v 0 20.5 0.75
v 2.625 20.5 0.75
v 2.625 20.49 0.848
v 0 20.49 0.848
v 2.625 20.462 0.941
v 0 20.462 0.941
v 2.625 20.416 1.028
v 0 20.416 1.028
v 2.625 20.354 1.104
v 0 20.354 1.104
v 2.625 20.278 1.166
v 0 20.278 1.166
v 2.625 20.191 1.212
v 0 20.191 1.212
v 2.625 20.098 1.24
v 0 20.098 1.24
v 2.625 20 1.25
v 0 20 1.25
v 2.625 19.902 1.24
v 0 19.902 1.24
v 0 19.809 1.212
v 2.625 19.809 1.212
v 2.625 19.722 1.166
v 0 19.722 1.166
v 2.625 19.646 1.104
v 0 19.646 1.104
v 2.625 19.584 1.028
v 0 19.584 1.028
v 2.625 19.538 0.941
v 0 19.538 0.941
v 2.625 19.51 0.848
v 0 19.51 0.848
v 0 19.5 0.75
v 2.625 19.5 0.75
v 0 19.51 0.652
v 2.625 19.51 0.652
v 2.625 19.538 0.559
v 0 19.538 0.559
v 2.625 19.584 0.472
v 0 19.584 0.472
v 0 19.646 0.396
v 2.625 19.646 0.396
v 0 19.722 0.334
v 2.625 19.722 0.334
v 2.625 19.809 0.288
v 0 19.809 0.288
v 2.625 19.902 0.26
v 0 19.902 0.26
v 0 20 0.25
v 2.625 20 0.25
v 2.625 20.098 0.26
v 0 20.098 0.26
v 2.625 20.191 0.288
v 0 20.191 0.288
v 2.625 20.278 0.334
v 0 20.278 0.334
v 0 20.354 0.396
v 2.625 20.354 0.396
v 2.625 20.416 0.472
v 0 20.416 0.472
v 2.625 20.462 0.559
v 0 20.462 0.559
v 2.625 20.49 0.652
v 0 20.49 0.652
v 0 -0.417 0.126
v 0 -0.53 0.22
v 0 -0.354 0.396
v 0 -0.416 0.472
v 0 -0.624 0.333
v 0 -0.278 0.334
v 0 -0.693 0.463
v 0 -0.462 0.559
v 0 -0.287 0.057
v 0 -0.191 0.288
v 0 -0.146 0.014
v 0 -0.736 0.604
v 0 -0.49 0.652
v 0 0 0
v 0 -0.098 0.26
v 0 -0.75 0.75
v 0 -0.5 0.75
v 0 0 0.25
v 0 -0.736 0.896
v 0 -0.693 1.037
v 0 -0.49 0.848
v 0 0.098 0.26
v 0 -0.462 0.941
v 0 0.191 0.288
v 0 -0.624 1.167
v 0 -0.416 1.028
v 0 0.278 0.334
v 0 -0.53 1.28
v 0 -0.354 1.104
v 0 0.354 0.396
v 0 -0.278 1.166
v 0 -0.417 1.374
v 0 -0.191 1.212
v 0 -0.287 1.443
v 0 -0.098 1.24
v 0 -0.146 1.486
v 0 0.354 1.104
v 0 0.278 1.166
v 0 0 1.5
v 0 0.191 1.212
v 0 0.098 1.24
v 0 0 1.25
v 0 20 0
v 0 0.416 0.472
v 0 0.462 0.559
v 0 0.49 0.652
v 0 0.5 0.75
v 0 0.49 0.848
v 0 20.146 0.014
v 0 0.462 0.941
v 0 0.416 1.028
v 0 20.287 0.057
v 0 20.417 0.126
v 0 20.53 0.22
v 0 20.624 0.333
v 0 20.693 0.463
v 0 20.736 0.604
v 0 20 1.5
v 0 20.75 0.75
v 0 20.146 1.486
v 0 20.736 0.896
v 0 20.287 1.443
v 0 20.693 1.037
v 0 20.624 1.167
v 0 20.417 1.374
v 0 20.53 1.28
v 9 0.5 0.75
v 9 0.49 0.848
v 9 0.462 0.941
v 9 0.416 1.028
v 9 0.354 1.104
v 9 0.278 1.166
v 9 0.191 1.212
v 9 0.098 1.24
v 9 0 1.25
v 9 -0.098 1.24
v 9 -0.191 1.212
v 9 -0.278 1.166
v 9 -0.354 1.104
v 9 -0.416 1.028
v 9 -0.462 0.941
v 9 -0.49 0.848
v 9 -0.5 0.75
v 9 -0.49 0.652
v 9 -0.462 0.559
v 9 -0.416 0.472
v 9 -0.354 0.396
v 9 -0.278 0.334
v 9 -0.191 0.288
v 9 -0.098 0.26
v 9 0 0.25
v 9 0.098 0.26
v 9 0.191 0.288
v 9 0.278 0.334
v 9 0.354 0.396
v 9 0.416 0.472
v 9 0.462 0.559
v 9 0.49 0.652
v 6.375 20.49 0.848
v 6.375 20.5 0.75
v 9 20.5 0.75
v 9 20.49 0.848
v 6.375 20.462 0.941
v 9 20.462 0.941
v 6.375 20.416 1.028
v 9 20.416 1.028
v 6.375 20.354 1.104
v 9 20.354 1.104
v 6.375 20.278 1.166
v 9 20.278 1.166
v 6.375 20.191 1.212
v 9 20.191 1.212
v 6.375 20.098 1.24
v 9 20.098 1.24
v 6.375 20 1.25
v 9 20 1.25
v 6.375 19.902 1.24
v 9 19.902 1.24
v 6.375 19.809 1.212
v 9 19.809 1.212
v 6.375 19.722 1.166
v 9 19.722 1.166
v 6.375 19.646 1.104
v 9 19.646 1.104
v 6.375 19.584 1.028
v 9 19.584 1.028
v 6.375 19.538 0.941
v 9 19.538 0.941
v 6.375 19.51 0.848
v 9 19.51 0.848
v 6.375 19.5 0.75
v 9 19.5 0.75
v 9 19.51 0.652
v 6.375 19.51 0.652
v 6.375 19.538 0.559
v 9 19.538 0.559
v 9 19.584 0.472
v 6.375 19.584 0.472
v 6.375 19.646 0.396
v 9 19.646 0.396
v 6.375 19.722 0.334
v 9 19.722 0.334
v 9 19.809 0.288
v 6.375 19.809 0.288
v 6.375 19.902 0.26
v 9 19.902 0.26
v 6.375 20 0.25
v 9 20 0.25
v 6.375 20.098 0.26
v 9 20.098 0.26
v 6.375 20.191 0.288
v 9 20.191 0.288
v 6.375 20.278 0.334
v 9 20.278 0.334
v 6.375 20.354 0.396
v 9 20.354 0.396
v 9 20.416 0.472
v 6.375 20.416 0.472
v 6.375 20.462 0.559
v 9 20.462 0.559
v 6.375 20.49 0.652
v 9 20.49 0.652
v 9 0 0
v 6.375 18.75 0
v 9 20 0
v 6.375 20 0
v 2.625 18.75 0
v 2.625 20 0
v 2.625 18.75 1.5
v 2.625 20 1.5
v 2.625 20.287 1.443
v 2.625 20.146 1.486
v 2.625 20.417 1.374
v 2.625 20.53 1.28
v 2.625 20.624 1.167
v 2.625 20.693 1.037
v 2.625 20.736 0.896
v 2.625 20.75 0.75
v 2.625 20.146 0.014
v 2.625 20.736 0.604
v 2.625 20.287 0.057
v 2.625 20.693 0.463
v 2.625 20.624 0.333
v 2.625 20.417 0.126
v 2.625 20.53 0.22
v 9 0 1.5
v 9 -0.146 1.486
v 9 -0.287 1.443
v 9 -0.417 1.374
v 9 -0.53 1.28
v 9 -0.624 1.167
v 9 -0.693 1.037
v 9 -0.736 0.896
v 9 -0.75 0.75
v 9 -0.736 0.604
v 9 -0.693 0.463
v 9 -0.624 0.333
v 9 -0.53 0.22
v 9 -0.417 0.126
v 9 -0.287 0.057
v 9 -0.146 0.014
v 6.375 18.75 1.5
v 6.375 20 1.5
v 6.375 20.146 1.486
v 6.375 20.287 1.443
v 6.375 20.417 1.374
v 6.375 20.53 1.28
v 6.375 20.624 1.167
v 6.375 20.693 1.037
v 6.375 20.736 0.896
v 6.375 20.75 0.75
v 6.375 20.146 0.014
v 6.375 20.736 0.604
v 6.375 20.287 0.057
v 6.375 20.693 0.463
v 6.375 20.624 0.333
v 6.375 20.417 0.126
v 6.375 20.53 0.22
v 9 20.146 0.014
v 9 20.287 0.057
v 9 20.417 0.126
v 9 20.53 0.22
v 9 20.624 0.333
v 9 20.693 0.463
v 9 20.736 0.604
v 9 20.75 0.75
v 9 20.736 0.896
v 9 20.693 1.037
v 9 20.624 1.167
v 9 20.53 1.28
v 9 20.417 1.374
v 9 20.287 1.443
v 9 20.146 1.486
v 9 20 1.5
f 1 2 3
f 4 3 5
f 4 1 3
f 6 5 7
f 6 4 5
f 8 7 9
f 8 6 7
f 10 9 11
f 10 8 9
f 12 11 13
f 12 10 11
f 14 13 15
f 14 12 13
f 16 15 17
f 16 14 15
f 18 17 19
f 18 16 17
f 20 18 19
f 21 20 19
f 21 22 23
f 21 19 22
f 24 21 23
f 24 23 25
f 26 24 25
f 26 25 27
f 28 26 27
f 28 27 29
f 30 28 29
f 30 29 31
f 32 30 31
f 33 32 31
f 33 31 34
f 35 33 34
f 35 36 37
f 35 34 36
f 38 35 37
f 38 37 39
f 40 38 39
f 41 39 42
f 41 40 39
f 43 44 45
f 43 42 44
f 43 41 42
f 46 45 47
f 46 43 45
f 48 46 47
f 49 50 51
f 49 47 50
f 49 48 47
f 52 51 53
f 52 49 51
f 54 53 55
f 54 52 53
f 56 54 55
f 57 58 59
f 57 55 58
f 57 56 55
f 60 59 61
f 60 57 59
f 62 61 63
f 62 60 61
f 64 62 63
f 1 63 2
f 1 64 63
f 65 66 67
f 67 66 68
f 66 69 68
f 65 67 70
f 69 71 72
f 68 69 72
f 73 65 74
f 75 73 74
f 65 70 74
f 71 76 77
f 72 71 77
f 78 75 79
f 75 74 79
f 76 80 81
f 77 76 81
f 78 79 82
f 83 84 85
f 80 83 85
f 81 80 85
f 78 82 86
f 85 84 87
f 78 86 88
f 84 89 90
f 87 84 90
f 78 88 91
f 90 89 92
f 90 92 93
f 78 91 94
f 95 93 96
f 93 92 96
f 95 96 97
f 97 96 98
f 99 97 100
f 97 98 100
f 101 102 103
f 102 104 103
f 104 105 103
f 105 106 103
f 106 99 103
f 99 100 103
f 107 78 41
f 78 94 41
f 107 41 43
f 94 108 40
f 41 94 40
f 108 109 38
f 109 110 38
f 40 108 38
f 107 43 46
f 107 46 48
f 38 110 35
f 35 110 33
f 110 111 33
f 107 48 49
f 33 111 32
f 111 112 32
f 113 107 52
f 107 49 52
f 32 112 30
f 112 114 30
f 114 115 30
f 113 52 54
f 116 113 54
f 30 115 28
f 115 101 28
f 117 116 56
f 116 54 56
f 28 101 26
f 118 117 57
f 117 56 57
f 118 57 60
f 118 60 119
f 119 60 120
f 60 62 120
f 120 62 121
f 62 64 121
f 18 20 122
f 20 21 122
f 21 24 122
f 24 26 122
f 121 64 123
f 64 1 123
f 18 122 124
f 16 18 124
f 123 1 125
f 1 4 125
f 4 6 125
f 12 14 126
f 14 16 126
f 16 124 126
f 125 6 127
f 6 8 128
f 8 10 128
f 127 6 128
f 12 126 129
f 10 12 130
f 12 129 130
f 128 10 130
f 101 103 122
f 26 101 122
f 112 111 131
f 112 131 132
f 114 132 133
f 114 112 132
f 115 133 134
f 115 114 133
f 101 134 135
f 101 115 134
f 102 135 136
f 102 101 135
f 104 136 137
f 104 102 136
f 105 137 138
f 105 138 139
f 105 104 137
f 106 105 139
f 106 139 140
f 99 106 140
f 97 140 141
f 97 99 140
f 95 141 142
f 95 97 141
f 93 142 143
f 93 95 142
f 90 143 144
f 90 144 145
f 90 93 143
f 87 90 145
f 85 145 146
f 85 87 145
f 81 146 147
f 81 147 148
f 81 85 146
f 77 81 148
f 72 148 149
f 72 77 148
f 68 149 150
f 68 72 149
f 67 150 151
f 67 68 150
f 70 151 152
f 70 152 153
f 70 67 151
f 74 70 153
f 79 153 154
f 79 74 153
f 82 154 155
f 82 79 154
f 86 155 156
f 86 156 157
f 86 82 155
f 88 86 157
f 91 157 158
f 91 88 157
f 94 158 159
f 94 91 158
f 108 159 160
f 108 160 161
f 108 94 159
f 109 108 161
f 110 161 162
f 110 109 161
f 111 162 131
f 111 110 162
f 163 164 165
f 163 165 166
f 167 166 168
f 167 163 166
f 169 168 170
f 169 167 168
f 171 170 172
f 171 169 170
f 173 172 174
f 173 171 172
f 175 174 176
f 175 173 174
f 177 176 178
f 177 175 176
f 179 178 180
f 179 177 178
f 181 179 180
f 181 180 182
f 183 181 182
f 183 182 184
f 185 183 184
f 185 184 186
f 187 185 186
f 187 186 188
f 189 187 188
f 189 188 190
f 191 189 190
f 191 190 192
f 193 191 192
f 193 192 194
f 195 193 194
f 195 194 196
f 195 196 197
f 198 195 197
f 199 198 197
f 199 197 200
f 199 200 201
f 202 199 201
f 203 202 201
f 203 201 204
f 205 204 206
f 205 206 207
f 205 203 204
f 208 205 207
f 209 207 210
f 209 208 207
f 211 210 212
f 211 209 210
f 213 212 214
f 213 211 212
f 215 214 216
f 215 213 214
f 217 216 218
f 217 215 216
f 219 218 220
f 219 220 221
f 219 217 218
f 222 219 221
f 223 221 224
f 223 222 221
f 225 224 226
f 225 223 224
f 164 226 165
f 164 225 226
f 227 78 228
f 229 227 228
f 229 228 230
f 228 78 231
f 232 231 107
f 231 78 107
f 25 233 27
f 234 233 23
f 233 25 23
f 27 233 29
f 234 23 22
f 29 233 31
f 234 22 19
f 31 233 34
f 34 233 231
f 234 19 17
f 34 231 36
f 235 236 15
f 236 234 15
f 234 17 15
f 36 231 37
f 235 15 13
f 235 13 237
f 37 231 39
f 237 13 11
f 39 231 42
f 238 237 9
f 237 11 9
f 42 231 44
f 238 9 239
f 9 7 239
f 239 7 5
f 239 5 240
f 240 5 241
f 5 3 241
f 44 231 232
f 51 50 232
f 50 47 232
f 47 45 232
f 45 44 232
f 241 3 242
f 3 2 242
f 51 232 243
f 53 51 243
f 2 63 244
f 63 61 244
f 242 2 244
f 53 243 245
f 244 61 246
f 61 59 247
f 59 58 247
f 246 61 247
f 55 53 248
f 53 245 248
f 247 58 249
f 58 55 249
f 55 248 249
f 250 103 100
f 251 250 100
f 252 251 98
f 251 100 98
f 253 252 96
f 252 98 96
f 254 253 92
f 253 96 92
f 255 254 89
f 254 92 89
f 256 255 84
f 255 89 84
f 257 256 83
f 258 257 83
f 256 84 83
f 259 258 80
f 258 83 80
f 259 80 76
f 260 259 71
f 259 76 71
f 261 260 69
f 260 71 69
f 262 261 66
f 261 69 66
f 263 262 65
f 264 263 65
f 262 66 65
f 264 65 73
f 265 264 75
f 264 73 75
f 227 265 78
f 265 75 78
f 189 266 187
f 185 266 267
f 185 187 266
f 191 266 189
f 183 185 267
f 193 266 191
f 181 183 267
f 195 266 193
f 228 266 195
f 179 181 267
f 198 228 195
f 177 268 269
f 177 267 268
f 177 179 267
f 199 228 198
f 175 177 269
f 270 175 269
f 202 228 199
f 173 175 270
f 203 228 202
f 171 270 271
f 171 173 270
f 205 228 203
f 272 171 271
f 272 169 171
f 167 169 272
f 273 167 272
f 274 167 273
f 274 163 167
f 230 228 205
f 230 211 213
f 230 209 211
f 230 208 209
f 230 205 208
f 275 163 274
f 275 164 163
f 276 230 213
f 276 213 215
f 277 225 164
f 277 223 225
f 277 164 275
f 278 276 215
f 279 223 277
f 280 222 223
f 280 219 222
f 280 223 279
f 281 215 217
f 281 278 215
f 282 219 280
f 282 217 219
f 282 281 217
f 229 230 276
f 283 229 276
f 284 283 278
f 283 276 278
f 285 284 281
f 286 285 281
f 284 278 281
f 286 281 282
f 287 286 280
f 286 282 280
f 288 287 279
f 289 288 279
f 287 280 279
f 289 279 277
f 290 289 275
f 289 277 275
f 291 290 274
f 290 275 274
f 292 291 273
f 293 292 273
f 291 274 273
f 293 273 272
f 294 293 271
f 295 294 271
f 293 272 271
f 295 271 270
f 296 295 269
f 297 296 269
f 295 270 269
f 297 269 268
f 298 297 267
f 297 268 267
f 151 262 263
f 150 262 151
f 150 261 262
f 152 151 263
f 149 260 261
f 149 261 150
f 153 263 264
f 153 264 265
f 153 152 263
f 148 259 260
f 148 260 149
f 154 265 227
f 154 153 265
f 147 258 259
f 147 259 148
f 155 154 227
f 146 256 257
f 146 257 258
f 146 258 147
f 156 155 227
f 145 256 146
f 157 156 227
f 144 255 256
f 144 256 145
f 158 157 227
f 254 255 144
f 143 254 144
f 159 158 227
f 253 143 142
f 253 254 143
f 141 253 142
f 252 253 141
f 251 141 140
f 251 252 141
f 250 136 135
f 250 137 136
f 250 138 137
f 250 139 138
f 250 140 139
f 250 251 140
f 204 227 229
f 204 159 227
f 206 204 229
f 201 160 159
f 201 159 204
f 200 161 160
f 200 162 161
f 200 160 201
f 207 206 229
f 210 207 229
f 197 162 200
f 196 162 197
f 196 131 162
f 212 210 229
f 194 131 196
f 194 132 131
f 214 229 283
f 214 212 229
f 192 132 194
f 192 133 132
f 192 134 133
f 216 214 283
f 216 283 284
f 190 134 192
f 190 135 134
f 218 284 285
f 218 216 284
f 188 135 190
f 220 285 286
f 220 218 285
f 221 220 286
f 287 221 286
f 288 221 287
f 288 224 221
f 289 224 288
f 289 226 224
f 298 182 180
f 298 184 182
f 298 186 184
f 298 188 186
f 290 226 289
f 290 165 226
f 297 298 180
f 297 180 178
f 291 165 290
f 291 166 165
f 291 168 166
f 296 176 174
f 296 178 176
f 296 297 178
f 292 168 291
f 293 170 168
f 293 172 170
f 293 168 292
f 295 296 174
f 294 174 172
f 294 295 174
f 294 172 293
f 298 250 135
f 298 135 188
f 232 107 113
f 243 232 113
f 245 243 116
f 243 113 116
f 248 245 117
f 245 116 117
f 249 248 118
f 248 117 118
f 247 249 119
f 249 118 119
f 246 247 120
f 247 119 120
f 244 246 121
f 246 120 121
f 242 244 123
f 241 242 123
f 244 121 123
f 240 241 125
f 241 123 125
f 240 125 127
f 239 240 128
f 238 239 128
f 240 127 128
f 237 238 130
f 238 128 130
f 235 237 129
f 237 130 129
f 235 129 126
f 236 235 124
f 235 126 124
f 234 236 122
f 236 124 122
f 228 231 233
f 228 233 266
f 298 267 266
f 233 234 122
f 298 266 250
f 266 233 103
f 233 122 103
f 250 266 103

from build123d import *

# Parameters (mm, degrees)
F0_R     = 0.5
F1_DEPTH = 9
F2_W     = 3.75
F2_H     = 2
F3_DEPTH = 1.501


with BuildPart() as f1:
    # F0 (on Right) → F1 (new body)
    with BuildSketch(Plane.YZ):
        with BuildLine():
            ThreePointArc((0, 1.5), (-0.75, 0.75), (0, 0))
            Line((0, 0), (20, 0))
            ThreePointArc((20, 0), (20.75, 0.75), (20, 1.5))
            Line((20, 1.5), (0, 1.5))
        make_face()
        with Locations((0, 0.75)):
            Circle(F0_R, mode=Mode.SUBTRACT)
        with Locations((20, 0.75)):
            Circle(F0_R, mode=Mode.SUBTRACT)
    extrude(amount=F1_DEPTH)

    # F2 (on Top) → F3 (cut, through all)
    with BuildSketch(Plane.XY):
        with Locations((4.5, 19.75)):
            Rectangle(F2_W, F2_H)
    extrude(amount=F3_DEPTH, mode=Mode.SUBTRACT)


solid = f1.part
